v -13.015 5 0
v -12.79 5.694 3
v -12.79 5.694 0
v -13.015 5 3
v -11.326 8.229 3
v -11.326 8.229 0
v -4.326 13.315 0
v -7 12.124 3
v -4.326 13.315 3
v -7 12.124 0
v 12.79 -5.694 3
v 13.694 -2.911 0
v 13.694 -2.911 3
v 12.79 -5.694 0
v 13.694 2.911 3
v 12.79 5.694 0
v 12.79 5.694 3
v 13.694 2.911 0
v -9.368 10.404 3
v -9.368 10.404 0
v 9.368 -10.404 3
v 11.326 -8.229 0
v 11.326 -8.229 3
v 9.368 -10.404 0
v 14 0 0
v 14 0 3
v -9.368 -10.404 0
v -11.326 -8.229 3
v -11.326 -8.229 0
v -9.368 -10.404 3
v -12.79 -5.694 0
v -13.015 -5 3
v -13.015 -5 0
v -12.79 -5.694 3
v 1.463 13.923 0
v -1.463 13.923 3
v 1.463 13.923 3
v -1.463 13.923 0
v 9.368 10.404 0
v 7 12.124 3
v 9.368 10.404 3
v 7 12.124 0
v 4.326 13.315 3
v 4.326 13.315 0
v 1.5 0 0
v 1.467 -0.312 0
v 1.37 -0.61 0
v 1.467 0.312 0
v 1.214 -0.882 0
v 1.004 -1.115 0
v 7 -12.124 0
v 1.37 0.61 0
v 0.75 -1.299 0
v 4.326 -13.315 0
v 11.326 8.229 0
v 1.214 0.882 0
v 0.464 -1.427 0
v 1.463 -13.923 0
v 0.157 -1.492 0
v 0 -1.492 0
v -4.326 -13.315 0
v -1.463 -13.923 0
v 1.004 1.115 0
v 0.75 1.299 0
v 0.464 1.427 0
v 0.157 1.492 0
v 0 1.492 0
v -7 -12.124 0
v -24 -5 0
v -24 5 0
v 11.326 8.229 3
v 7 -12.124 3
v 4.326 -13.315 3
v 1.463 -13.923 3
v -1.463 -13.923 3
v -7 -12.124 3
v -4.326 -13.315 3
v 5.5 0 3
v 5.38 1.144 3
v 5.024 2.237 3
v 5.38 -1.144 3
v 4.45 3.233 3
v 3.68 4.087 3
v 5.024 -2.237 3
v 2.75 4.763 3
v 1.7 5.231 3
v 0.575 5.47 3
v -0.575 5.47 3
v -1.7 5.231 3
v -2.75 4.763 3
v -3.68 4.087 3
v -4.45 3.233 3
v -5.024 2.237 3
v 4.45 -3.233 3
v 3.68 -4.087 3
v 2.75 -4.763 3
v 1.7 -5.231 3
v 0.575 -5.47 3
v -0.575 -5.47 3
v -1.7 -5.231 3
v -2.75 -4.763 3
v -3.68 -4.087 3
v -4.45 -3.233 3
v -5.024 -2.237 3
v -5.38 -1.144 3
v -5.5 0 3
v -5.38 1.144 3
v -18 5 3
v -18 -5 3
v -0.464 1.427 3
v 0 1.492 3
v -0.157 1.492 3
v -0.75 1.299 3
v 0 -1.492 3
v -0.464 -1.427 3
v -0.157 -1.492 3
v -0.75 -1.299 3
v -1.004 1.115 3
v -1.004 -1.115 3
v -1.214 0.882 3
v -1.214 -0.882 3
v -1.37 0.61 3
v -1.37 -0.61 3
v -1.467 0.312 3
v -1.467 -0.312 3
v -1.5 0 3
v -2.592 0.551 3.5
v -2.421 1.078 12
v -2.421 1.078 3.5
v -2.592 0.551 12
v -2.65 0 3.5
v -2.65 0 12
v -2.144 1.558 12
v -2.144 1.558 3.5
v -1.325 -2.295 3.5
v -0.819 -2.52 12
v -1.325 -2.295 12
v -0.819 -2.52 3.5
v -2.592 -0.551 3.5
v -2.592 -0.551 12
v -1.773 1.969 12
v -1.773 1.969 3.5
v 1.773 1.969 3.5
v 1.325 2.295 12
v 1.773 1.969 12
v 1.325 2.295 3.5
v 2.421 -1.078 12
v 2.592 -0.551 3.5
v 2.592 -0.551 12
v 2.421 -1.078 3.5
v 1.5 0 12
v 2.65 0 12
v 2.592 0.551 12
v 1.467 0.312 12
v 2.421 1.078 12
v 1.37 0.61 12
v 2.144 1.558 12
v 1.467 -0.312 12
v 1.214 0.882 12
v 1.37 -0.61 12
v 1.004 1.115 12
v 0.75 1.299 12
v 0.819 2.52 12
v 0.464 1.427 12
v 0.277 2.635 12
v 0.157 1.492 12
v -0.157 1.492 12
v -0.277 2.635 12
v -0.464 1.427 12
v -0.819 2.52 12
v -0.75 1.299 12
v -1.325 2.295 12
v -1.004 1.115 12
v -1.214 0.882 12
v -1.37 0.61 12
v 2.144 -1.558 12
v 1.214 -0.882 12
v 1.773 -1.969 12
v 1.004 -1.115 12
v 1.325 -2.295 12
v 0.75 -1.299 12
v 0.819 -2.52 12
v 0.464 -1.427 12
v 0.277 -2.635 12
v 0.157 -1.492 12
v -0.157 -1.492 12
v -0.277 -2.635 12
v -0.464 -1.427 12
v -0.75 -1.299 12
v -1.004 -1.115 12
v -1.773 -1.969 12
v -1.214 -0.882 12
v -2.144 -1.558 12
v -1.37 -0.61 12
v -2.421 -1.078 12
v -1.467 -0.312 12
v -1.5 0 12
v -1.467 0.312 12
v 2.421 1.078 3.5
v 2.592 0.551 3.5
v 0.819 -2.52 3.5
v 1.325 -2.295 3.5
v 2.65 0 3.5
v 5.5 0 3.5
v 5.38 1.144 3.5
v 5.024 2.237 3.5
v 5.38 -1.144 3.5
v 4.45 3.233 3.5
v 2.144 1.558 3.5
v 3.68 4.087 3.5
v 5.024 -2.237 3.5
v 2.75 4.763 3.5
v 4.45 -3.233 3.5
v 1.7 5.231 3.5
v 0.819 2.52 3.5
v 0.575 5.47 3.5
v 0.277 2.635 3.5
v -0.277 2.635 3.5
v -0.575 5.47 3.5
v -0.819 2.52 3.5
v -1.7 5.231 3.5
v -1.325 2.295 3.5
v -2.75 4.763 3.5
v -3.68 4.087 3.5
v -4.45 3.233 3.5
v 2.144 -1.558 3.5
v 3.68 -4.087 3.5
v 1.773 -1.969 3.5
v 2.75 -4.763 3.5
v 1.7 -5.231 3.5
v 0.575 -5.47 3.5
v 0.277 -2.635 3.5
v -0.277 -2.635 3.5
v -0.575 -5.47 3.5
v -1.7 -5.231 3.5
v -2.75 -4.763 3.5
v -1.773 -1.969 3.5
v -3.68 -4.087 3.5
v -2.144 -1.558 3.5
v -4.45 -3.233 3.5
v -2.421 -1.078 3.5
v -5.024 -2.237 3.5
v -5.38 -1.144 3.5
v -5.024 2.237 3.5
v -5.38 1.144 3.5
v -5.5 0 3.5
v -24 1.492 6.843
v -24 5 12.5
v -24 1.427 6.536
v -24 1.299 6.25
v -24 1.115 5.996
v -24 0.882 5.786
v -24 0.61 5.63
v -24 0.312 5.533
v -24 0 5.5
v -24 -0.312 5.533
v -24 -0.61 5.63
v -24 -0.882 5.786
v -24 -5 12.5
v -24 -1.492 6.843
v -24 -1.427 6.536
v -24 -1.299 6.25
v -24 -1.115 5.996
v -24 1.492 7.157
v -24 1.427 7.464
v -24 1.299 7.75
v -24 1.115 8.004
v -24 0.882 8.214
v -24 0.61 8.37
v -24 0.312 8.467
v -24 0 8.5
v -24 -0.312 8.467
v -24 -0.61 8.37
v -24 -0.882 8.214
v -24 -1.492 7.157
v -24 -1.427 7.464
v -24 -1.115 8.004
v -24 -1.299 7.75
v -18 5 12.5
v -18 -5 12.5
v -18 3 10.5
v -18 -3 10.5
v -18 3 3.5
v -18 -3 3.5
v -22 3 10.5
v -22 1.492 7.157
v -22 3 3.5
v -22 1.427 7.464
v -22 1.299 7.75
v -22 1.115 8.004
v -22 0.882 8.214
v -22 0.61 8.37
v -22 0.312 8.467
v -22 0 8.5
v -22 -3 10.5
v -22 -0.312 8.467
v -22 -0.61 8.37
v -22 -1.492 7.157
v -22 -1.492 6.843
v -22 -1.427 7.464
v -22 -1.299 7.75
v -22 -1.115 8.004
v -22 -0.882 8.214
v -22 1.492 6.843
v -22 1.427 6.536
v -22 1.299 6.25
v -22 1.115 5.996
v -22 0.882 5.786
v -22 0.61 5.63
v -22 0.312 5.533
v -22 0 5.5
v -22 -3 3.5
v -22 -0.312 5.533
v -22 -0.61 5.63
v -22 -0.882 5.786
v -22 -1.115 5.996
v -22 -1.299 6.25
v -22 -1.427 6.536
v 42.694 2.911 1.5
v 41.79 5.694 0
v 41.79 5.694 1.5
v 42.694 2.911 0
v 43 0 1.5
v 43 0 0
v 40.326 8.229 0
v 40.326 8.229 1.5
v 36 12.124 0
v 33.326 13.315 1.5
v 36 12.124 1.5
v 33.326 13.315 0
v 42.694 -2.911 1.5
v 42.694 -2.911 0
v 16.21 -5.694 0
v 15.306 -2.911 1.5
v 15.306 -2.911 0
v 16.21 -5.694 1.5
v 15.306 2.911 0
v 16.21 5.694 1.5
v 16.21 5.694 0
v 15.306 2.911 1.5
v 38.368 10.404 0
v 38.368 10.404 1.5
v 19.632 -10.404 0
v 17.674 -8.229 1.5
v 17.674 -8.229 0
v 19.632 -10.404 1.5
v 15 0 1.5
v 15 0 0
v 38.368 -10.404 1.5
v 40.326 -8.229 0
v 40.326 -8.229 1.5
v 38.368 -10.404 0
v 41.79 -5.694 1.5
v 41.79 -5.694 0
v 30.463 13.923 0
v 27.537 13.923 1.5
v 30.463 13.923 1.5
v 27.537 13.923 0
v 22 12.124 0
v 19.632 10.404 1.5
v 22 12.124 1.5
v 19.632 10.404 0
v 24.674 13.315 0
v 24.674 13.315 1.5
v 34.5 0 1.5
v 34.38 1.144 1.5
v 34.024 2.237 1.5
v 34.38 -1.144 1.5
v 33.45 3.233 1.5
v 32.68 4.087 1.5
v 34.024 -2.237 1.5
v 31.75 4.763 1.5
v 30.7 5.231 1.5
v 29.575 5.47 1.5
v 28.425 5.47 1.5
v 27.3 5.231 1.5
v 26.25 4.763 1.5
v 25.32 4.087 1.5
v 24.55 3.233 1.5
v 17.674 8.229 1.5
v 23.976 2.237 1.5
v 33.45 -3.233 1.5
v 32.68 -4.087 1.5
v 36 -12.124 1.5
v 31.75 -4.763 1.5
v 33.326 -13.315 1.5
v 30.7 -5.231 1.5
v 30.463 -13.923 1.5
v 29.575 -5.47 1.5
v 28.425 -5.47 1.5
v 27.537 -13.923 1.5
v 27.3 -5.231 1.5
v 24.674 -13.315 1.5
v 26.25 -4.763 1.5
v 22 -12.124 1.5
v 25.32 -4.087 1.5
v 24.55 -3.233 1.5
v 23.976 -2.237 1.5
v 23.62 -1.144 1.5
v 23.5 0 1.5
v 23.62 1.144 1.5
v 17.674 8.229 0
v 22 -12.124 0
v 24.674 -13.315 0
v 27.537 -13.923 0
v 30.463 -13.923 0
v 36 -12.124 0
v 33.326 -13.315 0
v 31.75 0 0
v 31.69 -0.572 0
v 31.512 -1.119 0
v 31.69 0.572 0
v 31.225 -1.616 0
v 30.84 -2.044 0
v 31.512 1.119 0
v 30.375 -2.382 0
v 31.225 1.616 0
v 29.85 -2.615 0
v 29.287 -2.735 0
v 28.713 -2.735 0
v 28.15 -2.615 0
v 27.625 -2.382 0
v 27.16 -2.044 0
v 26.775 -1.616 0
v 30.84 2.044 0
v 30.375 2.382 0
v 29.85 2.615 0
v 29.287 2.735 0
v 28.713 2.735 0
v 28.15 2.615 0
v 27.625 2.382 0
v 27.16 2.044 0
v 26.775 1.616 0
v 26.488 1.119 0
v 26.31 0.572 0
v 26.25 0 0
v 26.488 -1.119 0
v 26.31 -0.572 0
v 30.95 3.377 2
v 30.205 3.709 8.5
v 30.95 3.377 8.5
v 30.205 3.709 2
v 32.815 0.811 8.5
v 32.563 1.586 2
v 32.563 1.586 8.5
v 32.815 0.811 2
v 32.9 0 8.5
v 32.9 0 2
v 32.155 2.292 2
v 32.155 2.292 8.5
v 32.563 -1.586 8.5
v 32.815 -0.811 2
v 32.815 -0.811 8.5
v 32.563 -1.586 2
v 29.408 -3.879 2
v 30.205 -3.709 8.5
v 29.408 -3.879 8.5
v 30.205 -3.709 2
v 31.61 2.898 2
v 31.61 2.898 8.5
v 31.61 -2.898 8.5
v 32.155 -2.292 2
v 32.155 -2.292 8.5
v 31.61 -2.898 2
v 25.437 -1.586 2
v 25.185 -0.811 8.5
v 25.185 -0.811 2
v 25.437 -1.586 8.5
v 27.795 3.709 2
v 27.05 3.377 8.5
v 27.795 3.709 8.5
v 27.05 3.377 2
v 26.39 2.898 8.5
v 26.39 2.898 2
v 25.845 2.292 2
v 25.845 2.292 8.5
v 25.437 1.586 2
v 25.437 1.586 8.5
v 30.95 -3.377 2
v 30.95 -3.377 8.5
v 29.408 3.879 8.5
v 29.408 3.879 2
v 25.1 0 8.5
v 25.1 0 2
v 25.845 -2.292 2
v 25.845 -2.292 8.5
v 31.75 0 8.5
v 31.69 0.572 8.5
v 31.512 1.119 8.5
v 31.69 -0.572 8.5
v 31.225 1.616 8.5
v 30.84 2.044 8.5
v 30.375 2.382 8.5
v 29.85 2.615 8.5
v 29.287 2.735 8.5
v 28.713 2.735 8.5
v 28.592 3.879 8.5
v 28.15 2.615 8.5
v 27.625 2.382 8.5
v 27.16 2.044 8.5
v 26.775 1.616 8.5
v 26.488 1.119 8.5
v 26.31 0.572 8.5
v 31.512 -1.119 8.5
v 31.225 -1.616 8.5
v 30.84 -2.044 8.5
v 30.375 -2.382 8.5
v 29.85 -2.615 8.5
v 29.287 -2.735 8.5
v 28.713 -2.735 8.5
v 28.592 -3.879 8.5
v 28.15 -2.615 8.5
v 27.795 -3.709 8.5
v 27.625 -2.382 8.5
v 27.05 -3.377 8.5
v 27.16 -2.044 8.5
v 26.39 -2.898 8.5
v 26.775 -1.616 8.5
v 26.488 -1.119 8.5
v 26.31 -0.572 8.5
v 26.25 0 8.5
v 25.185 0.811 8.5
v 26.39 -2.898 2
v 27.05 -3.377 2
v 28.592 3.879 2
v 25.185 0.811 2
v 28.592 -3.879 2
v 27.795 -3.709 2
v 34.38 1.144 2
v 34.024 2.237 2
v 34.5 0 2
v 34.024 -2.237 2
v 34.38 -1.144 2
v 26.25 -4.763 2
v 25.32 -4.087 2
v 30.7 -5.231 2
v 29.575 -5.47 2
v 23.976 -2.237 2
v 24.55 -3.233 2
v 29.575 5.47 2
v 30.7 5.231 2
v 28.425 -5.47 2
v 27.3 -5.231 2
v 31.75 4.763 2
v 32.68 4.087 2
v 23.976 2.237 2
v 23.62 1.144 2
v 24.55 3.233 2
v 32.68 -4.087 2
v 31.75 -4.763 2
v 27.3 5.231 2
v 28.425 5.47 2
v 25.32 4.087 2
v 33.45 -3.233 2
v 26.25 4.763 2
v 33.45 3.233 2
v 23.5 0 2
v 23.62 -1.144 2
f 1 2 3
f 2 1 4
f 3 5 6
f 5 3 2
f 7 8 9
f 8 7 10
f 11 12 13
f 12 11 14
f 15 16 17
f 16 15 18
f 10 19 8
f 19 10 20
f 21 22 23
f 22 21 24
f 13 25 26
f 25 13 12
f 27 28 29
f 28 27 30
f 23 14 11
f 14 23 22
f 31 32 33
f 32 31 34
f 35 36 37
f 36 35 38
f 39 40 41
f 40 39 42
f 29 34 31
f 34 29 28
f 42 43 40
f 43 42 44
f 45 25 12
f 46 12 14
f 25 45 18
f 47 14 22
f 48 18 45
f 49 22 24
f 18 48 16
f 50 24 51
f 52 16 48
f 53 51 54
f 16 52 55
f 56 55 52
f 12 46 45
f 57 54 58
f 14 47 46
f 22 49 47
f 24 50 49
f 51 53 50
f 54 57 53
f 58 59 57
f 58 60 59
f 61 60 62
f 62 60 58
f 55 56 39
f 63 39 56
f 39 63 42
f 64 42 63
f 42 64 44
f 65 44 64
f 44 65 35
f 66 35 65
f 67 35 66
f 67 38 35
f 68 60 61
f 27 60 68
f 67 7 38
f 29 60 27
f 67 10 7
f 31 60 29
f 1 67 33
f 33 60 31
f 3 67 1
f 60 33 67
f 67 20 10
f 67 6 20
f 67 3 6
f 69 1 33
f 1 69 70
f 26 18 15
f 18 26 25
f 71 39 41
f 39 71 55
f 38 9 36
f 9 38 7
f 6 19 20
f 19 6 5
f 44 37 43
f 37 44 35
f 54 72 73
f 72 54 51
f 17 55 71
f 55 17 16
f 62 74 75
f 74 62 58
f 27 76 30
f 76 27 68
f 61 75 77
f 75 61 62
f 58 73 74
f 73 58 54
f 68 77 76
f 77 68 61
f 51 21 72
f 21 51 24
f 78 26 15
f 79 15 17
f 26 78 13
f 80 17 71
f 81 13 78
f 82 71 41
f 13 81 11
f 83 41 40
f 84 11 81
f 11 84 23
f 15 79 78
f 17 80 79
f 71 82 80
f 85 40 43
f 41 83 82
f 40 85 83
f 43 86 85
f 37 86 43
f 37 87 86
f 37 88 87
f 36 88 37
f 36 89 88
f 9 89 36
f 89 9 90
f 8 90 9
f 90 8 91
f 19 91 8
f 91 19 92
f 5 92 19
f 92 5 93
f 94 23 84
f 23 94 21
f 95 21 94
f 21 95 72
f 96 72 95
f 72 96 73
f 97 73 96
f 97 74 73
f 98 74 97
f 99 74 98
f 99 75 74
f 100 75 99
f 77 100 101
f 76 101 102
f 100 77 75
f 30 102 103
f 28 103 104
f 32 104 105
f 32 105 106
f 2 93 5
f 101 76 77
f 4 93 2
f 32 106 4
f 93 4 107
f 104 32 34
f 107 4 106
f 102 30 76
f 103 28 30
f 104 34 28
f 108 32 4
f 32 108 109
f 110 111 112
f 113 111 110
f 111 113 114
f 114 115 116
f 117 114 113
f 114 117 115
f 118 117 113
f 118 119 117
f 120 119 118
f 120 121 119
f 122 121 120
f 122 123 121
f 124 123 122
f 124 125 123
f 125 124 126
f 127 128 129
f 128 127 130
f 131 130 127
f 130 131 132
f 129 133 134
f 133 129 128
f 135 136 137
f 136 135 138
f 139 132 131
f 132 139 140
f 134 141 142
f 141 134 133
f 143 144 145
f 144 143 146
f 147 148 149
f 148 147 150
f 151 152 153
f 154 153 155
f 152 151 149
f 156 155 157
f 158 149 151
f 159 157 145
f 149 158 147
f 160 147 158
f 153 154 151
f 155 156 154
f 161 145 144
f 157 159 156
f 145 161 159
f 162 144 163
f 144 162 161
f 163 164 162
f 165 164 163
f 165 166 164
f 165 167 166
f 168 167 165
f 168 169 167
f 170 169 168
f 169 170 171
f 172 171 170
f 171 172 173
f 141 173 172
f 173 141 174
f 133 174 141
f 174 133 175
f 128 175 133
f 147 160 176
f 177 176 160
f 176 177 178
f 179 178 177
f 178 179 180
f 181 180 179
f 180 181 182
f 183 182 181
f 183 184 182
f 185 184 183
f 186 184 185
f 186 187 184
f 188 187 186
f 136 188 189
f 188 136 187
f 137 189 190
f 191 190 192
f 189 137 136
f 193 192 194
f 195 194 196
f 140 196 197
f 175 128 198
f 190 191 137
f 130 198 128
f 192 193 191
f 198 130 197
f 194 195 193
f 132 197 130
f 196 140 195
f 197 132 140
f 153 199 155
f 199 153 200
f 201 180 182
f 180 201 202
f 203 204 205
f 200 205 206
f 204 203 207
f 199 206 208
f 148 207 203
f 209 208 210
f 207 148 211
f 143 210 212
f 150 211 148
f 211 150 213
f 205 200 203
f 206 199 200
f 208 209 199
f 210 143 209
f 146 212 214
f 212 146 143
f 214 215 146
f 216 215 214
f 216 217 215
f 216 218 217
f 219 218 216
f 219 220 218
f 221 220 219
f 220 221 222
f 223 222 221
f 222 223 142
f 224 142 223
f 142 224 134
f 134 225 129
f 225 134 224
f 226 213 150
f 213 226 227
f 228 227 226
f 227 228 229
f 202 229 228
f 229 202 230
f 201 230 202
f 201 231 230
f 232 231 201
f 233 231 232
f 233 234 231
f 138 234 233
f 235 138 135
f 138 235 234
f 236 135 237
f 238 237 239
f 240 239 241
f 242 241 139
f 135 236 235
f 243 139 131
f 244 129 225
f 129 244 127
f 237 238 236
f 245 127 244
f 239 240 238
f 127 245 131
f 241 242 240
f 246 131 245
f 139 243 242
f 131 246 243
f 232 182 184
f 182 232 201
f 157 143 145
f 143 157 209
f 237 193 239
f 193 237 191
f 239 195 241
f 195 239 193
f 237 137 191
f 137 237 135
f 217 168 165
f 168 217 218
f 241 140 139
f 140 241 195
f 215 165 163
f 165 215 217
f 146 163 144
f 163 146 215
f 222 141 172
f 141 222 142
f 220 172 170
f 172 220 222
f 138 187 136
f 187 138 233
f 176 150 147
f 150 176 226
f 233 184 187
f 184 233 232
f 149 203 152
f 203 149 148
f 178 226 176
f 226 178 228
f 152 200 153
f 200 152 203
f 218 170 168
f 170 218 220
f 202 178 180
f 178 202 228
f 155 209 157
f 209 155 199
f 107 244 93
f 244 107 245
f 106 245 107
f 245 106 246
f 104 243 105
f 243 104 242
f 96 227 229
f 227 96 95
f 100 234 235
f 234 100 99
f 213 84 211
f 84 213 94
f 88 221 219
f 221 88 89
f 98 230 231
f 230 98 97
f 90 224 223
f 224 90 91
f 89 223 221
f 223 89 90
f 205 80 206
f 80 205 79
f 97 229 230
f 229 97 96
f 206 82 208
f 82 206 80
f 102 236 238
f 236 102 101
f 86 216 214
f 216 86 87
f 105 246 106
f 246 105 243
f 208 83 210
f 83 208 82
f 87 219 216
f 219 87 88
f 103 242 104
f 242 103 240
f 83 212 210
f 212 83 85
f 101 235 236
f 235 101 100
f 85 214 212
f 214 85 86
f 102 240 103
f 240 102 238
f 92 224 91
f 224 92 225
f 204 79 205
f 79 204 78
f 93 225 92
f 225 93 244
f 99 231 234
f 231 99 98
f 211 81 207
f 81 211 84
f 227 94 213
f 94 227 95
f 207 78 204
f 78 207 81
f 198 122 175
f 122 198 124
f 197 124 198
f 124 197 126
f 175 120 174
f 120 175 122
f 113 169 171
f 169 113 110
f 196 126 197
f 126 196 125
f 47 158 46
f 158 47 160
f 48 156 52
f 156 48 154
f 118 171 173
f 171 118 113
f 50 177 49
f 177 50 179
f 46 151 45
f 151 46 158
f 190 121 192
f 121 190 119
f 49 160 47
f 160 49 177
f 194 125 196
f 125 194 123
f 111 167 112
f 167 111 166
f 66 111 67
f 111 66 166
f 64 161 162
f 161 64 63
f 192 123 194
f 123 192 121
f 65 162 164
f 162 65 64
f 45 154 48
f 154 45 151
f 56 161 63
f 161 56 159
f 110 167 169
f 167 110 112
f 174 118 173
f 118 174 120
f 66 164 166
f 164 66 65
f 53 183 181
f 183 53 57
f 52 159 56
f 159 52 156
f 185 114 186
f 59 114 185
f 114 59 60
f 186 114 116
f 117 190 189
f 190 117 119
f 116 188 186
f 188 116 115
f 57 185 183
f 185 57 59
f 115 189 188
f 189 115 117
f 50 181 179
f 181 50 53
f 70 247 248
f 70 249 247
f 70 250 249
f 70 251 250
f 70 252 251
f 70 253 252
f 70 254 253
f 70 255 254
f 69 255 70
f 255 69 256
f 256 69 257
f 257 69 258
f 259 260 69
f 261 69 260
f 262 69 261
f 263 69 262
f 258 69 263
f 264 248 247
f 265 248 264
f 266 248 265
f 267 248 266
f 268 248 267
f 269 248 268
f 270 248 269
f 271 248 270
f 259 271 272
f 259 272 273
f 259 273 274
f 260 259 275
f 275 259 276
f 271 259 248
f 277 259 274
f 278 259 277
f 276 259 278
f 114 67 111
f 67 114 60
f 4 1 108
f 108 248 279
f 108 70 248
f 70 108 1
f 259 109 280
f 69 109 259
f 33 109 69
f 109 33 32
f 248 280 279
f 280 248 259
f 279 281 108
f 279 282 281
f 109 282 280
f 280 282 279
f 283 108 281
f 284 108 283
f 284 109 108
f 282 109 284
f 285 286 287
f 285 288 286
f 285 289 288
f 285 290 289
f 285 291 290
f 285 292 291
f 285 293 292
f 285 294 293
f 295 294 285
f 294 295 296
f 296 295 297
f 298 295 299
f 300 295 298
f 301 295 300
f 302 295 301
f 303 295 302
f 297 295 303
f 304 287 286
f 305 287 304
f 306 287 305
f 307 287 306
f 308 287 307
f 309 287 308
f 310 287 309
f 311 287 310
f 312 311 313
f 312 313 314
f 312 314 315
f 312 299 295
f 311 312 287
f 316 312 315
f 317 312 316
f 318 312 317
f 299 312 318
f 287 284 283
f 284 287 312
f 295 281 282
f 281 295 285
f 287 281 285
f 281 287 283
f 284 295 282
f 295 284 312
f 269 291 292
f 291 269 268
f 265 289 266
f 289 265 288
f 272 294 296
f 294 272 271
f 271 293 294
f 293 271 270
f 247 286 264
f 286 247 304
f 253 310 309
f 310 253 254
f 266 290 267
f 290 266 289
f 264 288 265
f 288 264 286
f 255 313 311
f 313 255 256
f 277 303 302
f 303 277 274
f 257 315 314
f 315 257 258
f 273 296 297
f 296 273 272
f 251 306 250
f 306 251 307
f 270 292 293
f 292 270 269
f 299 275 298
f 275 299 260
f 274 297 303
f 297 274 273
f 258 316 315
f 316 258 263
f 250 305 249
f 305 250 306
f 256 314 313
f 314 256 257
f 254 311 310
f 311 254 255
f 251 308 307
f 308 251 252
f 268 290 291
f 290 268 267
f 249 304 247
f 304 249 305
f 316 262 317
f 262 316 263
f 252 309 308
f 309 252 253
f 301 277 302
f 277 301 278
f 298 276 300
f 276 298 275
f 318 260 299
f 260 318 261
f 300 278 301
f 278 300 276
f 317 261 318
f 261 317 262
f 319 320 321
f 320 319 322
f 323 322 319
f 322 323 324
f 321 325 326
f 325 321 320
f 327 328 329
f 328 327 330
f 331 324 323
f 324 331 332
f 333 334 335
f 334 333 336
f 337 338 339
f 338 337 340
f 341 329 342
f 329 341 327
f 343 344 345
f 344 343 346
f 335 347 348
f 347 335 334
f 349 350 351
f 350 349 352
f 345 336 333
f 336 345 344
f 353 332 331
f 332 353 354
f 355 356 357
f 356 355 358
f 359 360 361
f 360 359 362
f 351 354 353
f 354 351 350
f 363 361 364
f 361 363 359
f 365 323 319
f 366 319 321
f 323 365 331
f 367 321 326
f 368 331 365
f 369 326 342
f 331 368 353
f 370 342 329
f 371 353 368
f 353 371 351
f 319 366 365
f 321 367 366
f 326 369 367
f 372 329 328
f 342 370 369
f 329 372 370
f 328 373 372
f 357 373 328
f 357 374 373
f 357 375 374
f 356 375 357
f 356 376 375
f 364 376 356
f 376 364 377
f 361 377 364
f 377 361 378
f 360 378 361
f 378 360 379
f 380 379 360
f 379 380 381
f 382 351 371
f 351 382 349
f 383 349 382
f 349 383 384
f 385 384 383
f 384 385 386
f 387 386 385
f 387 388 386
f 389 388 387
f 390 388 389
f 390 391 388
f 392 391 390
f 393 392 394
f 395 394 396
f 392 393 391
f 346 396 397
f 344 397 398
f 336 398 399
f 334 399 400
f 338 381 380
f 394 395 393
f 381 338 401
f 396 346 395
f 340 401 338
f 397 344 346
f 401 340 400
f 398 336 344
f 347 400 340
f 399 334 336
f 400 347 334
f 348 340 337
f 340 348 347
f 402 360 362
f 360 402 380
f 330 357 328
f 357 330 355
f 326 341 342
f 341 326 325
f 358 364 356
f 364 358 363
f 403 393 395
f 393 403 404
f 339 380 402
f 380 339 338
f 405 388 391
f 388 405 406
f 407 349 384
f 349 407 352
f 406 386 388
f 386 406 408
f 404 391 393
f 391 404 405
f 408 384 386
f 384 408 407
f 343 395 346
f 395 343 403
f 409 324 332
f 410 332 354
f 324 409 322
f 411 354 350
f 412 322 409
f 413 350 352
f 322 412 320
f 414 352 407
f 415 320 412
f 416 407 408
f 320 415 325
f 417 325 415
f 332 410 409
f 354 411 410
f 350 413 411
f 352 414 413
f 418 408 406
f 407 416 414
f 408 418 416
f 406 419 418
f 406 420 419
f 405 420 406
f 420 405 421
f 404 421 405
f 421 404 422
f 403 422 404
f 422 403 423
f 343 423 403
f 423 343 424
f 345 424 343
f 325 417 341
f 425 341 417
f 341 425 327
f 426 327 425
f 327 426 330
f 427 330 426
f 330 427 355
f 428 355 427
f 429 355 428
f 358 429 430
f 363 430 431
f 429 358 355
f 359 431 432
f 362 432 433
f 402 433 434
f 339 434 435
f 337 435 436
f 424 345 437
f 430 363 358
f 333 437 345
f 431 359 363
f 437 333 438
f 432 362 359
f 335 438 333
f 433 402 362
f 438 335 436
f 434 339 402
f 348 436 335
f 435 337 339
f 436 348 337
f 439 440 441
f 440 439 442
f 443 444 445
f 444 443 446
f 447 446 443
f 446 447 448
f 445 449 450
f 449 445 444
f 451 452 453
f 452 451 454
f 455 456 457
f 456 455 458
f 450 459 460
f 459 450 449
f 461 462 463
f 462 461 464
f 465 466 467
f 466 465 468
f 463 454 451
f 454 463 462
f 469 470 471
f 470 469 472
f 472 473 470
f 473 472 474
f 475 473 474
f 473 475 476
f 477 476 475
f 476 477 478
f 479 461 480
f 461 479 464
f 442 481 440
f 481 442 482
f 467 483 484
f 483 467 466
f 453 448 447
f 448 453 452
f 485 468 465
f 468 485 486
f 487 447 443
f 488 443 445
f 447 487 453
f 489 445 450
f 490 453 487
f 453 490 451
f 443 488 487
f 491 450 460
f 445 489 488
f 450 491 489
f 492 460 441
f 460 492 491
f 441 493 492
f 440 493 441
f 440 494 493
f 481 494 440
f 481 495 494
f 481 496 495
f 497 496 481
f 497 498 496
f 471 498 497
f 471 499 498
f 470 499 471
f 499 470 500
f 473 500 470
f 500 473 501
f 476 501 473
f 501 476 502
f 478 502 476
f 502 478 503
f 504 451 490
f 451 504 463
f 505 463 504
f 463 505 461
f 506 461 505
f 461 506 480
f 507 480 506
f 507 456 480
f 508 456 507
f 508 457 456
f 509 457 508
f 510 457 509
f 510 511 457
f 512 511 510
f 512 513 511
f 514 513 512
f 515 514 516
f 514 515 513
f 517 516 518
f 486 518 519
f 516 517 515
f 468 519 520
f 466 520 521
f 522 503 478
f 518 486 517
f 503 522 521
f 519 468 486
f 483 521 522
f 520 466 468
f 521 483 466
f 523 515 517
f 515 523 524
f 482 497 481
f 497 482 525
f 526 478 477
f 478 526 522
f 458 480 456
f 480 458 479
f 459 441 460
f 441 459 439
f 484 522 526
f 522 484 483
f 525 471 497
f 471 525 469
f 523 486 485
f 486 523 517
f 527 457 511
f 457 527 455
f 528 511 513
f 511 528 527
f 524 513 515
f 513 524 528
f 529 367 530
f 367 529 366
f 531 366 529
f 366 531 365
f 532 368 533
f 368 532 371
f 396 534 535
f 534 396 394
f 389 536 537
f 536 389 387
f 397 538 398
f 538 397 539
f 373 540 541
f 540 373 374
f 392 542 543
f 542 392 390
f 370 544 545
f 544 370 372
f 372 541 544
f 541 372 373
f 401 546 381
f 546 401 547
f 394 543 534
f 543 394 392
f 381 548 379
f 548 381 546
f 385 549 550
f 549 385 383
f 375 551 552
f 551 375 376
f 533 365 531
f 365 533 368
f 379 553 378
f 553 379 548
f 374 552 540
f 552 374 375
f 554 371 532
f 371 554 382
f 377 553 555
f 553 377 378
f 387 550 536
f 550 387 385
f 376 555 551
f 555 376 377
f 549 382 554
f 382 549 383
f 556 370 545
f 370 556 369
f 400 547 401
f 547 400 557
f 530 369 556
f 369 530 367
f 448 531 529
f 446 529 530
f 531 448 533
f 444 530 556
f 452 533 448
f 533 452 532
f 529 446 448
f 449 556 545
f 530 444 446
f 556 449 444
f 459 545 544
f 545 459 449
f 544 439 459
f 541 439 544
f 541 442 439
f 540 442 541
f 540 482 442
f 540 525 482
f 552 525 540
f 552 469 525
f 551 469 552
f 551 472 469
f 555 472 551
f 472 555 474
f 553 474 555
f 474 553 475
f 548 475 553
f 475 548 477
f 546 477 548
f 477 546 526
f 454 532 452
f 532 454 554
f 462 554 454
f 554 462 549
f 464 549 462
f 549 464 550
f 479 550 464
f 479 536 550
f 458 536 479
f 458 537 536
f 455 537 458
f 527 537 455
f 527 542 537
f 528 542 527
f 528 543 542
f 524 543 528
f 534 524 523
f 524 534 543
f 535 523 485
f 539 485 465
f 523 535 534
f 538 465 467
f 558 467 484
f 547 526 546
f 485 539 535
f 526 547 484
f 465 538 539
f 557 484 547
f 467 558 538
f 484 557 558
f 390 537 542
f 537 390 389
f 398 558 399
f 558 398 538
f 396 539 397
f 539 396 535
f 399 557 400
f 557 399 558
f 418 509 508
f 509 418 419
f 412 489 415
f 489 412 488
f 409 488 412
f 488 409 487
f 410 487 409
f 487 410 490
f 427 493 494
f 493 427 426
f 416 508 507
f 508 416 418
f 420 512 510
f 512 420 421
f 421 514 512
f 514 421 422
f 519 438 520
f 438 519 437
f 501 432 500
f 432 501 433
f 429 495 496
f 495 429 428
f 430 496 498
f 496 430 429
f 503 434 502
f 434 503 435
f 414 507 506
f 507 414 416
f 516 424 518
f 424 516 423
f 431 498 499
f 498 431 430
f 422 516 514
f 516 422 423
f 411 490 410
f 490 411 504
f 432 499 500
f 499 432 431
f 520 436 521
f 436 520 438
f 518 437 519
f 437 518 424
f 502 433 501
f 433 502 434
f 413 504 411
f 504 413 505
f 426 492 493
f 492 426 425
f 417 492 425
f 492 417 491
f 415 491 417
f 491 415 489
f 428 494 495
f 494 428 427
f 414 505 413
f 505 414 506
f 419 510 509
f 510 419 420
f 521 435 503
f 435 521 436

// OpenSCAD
d2=22;
d1=8;
w=7;
t=1.5;
$fn=30;

module bearing(){
difference(){
cylinder(d=d2,h=w,center=true);
cylinder(d=d1,h=w+w,center=true);
}
}

//bearing();

module flange(){

    translate([0,0,-w/2-t-.5])
    difference(){
    union(){
    cylinder(d=d2+6,h=t);
    cylinder(d=d1-0.2,h=w+t);
    translate([0,0,t])cylinder(d=d1+3,h=0.5);
    }
    cylinder(d=d1-2-.5,h=w+w+w+w,center=true);
    //translate([0,0,w/2+t+.5])rotate([90,0,0])cylinder(d=5,h=w+w+w,center=true);
    }
}

module flange2(){
    translate([0,0,w/2+.5])
    difference(){
    union(){
    cylinder(d=d2+6,h=t+t);
    translate([0,0,-w-t-.5])cylinder(d=d1-2-0.7,h=w+t);
    translate([0,0,-.5])cylinder(d=d1+3,h=0.5);    
    }
    cylinder(d=3,h=w+w+w+w,center=true);
   // translate([0,0,w/2+t+.5])rotate([90,0,0])cylinder(d=5,h=w+w+w,center=true);
    } 
}


module bracket(){
   z = w+0.5+0.5+3;
   x=6/2+d2/2+10;
   difference(){
        union(){
           translate([x/2,0,z/2])cube([x,10,3],center=true); 
           translate([x-3,0,0])cube([6,10,z],center=true);
        }
    translate([x-5,0,0])cube([6,6,z-4],center=true);
    rotate([0,90,0],center=true) cylinder(d=3,h=100,center=true);
    }
    
}

module hanger(){
    flange2();
    bracket();
}

//bearing();
translate([0,0,w/2+1.5+0.5+1.5] )rotate([0,180,0])hanger();
translate([d2+3+4,0,w/2+1.5+.5])flange();
